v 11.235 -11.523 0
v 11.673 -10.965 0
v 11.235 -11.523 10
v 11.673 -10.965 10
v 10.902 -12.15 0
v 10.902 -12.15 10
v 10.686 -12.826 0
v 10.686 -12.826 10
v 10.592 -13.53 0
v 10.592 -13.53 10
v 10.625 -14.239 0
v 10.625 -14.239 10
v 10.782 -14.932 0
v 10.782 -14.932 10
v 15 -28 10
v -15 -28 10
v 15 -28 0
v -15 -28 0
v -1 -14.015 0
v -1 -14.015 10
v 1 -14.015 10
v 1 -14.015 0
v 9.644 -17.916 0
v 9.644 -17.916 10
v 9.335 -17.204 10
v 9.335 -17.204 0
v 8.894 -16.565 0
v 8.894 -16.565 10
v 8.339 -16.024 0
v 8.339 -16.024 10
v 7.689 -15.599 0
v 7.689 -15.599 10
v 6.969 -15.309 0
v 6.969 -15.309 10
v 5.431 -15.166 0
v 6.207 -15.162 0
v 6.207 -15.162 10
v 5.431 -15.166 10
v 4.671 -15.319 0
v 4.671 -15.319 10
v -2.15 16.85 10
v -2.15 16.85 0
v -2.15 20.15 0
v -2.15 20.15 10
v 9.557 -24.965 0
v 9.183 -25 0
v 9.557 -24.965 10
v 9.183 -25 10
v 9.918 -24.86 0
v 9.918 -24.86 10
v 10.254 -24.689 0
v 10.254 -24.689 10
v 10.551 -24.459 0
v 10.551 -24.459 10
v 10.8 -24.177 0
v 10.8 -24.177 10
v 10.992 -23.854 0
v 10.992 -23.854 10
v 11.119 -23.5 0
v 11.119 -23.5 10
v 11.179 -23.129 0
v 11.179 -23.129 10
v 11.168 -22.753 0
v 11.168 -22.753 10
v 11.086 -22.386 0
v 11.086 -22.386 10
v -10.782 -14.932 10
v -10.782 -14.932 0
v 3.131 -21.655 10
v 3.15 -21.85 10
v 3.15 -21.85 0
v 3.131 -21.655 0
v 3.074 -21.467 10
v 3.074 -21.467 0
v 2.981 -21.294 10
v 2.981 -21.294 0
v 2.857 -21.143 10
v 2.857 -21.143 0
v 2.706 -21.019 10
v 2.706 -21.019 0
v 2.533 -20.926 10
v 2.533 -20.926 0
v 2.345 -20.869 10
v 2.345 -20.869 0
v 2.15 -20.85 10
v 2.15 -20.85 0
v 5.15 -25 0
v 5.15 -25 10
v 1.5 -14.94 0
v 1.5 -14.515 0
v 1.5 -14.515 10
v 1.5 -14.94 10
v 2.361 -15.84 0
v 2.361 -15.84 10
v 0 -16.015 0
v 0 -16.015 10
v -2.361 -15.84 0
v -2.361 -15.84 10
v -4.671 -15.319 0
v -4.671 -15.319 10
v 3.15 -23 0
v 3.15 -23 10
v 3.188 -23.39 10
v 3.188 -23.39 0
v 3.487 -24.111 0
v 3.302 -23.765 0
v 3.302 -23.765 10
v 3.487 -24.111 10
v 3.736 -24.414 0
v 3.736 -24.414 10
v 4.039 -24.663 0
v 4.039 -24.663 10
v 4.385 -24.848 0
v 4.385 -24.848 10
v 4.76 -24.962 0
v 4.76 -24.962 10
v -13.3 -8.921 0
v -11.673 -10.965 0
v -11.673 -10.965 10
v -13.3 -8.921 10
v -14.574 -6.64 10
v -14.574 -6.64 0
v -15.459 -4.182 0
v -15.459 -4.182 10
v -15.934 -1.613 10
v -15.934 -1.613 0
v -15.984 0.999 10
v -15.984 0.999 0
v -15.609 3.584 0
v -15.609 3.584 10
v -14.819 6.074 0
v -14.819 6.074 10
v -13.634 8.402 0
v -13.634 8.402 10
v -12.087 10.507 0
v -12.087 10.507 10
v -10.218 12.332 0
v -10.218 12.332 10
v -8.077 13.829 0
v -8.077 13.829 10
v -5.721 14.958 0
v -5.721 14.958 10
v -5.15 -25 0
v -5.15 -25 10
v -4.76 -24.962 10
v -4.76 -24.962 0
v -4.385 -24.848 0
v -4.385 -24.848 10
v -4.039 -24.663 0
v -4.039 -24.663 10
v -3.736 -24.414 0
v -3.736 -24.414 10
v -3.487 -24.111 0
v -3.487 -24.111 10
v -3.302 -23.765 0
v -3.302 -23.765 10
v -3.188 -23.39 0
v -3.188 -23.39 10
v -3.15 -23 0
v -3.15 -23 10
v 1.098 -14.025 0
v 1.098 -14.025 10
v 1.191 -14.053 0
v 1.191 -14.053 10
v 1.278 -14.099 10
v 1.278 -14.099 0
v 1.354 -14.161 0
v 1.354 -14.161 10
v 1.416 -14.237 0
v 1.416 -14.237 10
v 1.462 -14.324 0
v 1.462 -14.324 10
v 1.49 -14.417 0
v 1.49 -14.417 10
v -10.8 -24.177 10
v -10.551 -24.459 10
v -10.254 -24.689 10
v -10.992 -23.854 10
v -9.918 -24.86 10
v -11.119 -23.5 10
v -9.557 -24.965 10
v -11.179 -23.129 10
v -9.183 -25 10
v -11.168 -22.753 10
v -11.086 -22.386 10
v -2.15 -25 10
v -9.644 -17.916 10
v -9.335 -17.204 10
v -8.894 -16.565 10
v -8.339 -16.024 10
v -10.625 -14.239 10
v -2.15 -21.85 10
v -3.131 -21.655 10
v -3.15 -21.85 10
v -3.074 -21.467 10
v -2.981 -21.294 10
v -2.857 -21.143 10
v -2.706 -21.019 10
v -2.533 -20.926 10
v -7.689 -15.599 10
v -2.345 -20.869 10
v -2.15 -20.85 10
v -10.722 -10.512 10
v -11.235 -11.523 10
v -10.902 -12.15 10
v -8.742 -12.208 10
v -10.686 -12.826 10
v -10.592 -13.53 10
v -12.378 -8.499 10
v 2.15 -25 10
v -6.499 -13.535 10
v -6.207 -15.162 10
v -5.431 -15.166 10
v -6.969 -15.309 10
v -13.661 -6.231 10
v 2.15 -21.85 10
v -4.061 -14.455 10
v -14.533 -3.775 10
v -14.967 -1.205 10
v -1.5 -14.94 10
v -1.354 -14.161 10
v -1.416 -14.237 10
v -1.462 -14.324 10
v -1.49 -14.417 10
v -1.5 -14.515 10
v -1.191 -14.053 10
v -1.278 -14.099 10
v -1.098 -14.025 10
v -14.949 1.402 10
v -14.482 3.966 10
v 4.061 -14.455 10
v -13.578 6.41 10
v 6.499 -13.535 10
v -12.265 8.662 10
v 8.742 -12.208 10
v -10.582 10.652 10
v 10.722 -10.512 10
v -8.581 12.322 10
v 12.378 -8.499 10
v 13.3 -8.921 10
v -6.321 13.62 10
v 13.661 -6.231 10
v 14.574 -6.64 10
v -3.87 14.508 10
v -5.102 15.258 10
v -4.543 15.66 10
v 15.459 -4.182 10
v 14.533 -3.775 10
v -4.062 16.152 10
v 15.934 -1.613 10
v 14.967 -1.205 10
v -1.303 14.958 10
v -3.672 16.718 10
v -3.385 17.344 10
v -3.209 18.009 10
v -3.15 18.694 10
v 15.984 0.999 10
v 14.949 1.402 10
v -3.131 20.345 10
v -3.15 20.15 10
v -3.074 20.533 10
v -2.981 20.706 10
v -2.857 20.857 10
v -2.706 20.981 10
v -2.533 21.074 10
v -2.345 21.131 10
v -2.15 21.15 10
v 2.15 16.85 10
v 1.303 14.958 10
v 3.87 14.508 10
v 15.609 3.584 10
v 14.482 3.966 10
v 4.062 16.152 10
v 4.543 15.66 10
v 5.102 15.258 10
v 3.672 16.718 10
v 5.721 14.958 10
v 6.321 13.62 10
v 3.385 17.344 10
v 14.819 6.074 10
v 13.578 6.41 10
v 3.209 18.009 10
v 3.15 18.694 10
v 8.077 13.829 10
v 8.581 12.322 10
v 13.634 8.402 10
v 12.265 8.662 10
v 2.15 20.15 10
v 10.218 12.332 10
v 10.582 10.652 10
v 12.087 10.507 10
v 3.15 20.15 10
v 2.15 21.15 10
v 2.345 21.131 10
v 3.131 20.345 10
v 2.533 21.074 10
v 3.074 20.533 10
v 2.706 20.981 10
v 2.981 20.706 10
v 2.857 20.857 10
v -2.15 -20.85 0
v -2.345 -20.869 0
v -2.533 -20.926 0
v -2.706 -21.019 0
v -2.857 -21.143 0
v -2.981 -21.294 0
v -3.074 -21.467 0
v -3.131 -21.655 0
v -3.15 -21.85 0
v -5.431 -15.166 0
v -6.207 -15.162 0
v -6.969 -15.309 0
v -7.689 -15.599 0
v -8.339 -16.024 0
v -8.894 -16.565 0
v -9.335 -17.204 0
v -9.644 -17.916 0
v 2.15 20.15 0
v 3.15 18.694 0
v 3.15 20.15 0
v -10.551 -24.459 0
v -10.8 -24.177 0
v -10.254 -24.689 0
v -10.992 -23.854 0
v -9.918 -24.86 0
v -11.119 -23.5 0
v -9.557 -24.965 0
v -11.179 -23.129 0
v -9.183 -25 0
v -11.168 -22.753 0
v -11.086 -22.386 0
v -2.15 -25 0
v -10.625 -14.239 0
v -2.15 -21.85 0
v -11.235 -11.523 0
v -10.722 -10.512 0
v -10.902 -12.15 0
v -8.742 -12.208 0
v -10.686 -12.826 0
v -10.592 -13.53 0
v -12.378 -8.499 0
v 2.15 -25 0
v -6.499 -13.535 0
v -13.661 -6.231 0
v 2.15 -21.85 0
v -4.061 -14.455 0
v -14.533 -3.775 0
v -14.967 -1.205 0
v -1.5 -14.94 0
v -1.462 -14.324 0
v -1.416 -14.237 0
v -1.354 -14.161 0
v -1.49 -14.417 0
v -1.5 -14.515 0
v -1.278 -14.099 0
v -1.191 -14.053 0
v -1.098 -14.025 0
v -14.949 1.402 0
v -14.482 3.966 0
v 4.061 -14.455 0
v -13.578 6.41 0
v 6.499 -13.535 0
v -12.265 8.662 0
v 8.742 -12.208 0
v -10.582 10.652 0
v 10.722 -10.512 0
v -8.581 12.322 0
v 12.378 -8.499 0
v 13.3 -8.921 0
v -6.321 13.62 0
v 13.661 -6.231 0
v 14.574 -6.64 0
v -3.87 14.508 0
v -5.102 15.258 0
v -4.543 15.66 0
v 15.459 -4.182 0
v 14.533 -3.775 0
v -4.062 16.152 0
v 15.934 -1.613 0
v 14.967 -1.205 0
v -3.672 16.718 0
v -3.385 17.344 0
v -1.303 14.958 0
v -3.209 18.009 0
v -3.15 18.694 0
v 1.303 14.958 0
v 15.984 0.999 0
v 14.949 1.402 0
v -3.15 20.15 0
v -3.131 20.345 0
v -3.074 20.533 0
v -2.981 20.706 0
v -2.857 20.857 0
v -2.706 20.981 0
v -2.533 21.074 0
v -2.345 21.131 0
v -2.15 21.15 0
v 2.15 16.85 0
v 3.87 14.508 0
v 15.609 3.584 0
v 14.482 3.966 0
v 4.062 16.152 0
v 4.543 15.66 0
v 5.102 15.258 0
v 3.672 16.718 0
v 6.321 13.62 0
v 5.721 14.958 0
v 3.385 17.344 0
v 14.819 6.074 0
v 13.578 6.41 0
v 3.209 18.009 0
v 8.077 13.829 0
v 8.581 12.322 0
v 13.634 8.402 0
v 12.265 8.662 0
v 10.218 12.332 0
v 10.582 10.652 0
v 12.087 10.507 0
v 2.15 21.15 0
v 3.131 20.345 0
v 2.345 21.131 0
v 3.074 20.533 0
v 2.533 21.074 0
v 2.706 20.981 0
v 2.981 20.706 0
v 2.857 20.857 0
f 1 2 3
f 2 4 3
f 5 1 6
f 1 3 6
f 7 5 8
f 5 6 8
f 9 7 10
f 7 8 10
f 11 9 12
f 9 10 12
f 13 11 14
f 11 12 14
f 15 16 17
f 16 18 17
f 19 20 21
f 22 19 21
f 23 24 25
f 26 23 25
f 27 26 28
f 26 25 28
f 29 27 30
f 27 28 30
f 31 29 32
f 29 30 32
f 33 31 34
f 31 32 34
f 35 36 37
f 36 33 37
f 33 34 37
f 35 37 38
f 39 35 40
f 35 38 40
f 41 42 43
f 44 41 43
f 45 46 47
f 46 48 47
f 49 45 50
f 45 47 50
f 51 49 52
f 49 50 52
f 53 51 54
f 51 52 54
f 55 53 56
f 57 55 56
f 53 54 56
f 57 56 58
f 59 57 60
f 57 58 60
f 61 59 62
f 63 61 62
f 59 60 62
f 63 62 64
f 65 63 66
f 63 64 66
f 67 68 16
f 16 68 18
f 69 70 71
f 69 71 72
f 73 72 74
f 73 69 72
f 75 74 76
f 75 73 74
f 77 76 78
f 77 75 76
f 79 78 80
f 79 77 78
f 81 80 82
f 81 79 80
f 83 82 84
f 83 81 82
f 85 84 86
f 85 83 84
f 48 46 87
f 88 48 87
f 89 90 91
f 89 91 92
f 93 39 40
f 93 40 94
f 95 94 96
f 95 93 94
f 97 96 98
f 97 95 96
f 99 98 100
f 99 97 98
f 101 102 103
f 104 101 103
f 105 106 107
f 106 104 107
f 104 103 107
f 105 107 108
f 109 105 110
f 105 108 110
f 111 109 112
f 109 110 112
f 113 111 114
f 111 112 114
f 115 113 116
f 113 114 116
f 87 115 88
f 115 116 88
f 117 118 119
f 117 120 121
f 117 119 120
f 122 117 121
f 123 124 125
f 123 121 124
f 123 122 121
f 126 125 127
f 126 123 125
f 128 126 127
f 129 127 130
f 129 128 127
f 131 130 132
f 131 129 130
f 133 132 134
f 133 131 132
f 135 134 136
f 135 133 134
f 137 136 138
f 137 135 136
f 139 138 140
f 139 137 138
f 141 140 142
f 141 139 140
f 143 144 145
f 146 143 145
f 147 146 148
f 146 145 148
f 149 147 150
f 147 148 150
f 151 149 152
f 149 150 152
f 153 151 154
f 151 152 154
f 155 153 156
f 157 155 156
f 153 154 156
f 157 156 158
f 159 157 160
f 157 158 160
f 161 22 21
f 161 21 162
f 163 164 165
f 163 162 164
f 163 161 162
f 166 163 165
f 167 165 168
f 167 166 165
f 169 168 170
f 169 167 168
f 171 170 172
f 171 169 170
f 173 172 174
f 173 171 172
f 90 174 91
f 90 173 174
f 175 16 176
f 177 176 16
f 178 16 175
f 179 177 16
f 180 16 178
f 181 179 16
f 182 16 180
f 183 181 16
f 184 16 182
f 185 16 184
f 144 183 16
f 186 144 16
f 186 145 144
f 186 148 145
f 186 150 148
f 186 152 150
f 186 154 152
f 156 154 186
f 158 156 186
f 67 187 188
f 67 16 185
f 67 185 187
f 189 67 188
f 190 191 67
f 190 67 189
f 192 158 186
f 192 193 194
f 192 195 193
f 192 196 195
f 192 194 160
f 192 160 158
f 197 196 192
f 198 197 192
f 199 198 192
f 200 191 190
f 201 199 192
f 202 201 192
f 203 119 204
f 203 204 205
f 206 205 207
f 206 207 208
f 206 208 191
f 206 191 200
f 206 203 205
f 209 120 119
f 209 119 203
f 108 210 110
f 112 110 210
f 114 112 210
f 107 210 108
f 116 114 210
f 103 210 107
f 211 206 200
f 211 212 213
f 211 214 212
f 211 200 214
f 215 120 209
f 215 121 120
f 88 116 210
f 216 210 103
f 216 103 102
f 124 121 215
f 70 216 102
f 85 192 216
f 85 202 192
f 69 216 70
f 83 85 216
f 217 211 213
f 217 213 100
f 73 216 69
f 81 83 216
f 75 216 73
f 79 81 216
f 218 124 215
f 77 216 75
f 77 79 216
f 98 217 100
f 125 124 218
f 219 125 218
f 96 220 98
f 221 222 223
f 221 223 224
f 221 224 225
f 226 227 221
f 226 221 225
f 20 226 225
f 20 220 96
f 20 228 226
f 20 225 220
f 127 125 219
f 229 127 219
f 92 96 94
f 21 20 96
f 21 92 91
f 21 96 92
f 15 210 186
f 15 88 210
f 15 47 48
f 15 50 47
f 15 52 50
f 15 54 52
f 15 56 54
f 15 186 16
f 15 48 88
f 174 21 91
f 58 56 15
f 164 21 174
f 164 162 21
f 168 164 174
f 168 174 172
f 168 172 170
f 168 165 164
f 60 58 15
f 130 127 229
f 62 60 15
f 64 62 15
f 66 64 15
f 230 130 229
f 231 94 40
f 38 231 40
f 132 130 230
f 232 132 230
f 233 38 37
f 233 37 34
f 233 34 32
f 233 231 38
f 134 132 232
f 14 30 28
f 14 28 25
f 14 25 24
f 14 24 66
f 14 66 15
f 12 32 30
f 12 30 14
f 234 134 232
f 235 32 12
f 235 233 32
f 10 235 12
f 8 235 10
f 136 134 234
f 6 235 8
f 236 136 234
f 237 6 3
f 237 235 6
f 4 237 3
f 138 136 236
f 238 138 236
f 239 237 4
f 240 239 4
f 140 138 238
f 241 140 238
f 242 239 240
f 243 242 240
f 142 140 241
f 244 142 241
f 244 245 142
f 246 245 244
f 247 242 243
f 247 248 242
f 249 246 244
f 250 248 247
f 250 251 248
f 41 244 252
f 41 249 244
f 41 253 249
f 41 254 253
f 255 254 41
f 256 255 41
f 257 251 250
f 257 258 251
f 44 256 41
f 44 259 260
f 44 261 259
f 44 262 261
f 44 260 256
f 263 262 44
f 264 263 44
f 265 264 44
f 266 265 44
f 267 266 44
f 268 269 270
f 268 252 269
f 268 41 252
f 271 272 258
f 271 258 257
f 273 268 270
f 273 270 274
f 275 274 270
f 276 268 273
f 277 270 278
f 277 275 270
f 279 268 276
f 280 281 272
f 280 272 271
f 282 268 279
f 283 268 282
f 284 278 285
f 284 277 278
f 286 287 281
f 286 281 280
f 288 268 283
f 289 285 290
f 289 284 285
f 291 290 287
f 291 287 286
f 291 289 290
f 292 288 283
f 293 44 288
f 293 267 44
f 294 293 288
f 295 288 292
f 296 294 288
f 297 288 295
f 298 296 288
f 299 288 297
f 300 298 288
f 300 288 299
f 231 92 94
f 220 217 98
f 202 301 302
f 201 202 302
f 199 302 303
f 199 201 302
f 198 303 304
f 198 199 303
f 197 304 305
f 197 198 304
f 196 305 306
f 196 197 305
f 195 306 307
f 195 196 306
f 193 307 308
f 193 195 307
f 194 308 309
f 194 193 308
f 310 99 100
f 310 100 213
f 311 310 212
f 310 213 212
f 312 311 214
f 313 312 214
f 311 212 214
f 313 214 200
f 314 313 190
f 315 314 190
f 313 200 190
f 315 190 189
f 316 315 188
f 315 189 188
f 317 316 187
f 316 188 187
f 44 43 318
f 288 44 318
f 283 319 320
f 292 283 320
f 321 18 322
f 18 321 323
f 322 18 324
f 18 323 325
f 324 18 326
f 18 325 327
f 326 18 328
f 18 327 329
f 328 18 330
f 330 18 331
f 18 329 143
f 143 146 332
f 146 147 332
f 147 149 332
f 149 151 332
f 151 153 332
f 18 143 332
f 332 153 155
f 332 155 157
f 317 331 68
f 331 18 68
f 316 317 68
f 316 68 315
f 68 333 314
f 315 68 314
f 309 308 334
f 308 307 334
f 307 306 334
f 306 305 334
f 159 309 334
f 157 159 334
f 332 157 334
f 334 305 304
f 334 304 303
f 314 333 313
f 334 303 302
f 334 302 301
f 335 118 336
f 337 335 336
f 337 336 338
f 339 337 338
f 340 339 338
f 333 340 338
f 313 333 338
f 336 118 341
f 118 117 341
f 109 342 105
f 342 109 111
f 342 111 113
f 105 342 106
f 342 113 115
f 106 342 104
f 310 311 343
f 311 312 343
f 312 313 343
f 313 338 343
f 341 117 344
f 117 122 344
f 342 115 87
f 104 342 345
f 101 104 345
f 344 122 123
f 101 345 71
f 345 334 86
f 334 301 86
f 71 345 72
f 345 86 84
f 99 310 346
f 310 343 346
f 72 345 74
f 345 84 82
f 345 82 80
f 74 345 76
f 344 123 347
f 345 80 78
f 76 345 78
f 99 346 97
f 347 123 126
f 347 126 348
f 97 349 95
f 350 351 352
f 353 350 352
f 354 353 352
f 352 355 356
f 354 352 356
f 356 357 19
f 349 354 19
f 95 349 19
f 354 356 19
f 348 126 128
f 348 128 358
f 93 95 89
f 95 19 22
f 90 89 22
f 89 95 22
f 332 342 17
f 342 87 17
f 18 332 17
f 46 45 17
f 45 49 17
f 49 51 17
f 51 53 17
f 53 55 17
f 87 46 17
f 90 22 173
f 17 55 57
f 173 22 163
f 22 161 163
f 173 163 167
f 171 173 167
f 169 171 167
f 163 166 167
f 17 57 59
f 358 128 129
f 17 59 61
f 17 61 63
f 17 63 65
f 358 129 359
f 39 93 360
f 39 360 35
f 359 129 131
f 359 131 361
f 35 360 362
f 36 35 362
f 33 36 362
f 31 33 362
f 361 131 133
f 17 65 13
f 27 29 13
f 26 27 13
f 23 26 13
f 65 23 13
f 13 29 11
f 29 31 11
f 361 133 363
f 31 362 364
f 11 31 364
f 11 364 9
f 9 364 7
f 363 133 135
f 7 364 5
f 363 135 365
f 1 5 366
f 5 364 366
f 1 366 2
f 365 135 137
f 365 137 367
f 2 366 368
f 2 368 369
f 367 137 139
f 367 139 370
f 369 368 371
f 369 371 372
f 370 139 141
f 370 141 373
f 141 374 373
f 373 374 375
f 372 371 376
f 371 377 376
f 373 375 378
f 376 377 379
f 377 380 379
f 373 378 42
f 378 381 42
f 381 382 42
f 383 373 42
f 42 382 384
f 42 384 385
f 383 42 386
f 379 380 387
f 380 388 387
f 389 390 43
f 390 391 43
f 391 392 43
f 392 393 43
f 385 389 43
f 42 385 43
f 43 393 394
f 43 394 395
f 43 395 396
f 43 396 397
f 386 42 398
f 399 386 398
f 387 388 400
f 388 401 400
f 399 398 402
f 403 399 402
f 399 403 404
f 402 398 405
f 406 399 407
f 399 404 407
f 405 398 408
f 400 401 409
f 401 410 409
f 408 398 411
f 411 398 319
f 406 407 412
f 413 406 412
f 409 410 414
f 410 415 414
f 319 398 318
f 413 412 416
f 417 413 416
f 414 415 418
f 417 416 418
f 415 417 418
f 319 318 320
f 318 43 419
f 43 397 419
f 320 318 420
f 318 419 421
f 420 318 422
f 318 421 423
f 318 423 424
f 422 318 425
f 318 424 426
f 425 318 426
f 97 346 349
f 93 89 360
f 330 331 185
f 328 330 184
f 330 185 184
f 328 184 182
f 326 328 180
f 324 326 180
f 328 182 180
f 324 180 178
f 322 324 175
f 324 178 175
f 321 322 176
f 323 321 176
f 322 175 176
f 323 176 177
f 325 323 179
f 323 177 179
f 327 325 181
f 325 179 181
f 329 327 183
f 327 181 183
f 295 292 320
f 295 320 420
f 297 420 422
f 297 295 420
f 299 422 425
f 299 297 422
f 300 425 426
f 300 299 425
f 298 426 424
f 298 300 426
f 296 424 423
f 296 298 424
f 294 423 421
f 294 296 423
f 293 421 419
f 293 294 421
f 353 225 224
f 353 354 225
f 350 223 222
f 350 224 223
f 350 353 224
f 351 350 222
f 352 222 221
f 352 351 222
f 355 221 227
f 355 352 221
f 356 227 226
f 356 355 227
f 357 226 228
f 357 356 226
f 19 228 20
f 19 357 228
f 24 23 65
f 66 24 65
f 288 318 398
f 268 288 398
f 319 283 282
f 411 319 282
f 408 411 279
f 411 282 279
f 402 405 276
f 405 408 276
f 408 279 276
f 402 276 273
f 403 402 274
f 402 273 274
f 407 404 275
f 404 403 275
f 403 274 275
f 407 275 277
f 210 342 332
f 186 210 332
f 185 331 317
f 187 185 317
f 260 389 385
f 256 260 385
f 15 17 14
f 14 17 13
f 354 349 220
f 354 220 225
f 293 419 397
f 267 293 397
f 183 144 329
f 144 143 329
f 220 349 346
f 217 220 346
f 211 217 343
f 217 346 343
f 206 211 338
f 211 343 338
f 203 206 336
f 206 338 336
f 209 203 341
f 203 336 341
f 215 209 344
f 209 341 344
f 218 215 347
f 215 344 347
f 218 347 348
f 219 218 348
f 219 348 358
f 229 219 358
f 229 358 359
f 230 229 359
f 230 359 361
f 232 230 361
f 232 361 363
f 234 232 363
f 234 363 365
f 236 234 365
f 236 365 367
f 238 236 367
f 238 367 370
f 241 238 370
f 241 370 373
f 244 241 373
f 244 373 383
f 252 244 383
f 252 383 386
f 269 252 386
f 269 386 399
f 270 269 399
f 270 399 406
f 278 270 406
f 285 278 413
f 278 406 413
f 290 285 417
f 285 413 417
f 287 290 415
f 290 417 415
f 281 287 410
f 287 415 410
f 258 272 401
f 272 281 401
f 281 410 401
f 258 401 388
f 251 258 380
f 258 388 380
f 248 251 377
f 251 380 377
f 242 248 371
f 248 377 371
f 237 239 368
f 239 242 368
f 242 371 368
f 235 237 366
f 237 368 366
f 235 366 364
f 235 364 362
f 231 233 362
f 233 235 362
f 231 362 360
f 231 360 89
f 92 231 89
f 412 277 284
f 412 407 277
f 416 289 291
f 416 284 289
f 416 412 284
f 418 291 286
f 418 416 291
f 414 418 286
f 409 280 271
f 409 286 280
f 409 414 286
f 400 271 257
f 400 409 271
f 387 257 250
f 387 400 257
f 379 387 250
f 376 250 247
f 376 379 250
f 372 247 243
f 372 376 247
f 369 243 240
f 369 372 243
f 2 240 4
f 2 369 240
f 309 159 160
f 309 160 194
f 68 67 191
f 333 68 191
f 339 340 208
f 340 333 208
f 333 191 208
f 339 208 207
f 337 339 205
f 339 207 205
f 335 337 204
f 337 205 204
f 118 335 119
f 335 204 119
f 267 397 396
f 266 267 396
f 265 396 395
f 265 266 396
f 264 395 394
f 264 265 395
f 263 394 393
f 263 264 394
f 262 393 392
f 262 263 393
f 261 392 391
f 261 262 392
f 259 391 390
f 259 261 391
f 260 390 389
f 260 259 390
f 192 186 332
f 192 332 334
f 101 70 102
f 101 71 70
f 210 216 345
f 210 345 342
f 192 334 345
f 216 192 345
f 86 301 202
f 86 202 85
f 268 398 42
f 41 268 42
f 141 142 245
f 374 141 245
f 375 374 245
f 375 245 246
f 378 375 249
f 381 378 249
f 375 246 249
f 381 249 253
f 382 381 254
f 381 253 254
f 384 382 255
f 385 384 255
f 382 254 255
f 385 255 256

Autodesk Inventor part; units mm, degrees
ref_plane "YZ Plane" through (0, 0, 0) normal (1, 0, 0) x (0, 1, 0)
ref_plane "XZ Plane" through (0, 0, 0) normal (0, 1, 0) x (-1, 0, 0)
ref_plane "XY Plane" through (0, 0, 0) normal (0, 0, 1) x (1, 0, 0)
sketch "Sketch1" plane through (0, 0, 0) normal (0, 0, 1) x (1, 0, 0)
  circle A0 centre (0, 0) radius 15.015
  circle A1 centre (0, 0) radius 16.015
  line L0 (-10, -12.5092) -> (-15, -28)
  line L1 (-15, -28) -> (15, -28)
  line L2 (15, -28) -> (10, -12.5092)
  line L3 (8.2846, -13.7057) -> (11.9301, -25)
  line L4 (11.9301, -25) -> (3.15, -25)
  line L5 (-11.9301, -25) -> (-8.2846, -13.7057)
  line L6 (-1.5, -14.9399) -> (-1.5, -14.515)
  line L7 (-1, -14.015) -> (1, -14.015)
  line L8 (1.5, -14.515) -> (1.5, -14.9399)
  arc A2 (-1, -14.015) -> (-1.5, -14.515) centre (-1, -14.515) ccw
  arc A3 (1.5, -14.515) -> (1, -14.015) centre (1, -14.515) ccw
  line L9 (2, -25) -> (2, -22) construction
  line L10 (2, -22) -> (-2, -22) construction
  line L11 (-2, -22) -> (-2, -25) construction
  line L12 (-2.15, -25) -> (-2.15, -21.85)
  line L13 (-2.15, -21.85) -> (2.15, -21.85)
  line L14 (2.15, -21.85) -> (2.15, -25)
  line L15 (-3.15, -25) -> (-3.15, -20.85)
  line L16 (-3.15, -20.85) -> (3.15, -20.85)
  line L17 (3.15, -20.85) -> (3.15, -25)
  line L18 (3.15, -25) -> (2.15, -25)
  line L19 (2.15, -25) -> (-2.15, -25)
  line L20 (-2.15, -25) -> (-3.15, -25)
  line L21 (-3.15, -25) -> (-11.9301, -25)
  line L22 (2, 20) -> (-2, 20) construction
  line L23 (-2, 20) -> (-2, 17) construction
  line L24 (-2, 17) -> (2, 17) construction
  line L25 (2, 17) -> (2, 20) construction
  line L26 (-2.15, 16.85) -> (-2.15, 20.15)
  line L27 (-2.15, 20.15) -> (2.15, 20.15)
  line L28 (2.15, 20.15) -> (2.15, 16.85)
  line L29 (2.15, 16.85) -> (-2.15, 16.85)
  line L30 (3.15, 15.7022) -> (3.15, 21.15)
  line L31 (3.15, 21.15) -> (-3.15, 21.15)
  line L32 (-3.15, 21.15) -> (-3.15, 15.7022)
  point P0 (0, -28)
  point P1 (-1.5, -14.015)
  point P2 (1.5, -14.015)
  point P3 (0, -14.015)
  point P4 (0, -15.015)
  point P5 (0, -22)
  point P6 (0, -25)
  point P7 (0, -25)
  point P8 (0, 17)
  dimension "d0" = 28
  dimension "d1" = 1
  dimension "d2" = 30
  dimension "d3" = 30.03
  dimension "d4" = 20
  dimension "d5" = 3
  dimension "d6" = 2
  dimension "d10" = 3
  dimension "d12" = 1
  dimension "d13" = 0.5
  dimension "d14" = 3
  dimension "d15" = 4
  dimension "d16" = 0.15
  dimension "d17" = 1
  dimension "d21" = 4
  dimension "d22" = 3
  dimension "d23" = 17
  dimension "d24" = 0.15
  dimension "d25" = 1
  dimension "d26" = 1
  dimension "d27" = 1
extrude "Extrusion1" add sketch "Sketch1" along normal blind 10 contours L6 A2 L7 A3 L8 A0 | A1 | A1 L32 L31 L30 | L2 L1 L0 A1 L5 L21 L20 L19 L18 L4 L3 | L18 L14 L13 L12 L20 L15 L16 L17 picked at (0.1669, -14.3455)
fillet "Fillet1" radius 4 6 edges at (10, -12.5092, 5) (8.2846, -13.7057, 5) (-8.2846, -13.7057, 5) (-10, -12.5092, 5) (3.15, 15.7022, 5) (-3.15, 15.7022, 5)
fillet "Fillet1" radius 2 4 edges at (11.9301, -25, 5) (-11.9301, -25, 5) (-3.15, -25, 5) (3.15, -25, 5)
fillet "Fillet1" radius 1 4 edges at (3.15, -20.85, 5) (-3.15, -20.85, 5) (3.15, 21.15, 5) (-3.15, 21.15, 5)
properties part number "Motor Reversed Mount Midsection" material "ABS Plastic"
